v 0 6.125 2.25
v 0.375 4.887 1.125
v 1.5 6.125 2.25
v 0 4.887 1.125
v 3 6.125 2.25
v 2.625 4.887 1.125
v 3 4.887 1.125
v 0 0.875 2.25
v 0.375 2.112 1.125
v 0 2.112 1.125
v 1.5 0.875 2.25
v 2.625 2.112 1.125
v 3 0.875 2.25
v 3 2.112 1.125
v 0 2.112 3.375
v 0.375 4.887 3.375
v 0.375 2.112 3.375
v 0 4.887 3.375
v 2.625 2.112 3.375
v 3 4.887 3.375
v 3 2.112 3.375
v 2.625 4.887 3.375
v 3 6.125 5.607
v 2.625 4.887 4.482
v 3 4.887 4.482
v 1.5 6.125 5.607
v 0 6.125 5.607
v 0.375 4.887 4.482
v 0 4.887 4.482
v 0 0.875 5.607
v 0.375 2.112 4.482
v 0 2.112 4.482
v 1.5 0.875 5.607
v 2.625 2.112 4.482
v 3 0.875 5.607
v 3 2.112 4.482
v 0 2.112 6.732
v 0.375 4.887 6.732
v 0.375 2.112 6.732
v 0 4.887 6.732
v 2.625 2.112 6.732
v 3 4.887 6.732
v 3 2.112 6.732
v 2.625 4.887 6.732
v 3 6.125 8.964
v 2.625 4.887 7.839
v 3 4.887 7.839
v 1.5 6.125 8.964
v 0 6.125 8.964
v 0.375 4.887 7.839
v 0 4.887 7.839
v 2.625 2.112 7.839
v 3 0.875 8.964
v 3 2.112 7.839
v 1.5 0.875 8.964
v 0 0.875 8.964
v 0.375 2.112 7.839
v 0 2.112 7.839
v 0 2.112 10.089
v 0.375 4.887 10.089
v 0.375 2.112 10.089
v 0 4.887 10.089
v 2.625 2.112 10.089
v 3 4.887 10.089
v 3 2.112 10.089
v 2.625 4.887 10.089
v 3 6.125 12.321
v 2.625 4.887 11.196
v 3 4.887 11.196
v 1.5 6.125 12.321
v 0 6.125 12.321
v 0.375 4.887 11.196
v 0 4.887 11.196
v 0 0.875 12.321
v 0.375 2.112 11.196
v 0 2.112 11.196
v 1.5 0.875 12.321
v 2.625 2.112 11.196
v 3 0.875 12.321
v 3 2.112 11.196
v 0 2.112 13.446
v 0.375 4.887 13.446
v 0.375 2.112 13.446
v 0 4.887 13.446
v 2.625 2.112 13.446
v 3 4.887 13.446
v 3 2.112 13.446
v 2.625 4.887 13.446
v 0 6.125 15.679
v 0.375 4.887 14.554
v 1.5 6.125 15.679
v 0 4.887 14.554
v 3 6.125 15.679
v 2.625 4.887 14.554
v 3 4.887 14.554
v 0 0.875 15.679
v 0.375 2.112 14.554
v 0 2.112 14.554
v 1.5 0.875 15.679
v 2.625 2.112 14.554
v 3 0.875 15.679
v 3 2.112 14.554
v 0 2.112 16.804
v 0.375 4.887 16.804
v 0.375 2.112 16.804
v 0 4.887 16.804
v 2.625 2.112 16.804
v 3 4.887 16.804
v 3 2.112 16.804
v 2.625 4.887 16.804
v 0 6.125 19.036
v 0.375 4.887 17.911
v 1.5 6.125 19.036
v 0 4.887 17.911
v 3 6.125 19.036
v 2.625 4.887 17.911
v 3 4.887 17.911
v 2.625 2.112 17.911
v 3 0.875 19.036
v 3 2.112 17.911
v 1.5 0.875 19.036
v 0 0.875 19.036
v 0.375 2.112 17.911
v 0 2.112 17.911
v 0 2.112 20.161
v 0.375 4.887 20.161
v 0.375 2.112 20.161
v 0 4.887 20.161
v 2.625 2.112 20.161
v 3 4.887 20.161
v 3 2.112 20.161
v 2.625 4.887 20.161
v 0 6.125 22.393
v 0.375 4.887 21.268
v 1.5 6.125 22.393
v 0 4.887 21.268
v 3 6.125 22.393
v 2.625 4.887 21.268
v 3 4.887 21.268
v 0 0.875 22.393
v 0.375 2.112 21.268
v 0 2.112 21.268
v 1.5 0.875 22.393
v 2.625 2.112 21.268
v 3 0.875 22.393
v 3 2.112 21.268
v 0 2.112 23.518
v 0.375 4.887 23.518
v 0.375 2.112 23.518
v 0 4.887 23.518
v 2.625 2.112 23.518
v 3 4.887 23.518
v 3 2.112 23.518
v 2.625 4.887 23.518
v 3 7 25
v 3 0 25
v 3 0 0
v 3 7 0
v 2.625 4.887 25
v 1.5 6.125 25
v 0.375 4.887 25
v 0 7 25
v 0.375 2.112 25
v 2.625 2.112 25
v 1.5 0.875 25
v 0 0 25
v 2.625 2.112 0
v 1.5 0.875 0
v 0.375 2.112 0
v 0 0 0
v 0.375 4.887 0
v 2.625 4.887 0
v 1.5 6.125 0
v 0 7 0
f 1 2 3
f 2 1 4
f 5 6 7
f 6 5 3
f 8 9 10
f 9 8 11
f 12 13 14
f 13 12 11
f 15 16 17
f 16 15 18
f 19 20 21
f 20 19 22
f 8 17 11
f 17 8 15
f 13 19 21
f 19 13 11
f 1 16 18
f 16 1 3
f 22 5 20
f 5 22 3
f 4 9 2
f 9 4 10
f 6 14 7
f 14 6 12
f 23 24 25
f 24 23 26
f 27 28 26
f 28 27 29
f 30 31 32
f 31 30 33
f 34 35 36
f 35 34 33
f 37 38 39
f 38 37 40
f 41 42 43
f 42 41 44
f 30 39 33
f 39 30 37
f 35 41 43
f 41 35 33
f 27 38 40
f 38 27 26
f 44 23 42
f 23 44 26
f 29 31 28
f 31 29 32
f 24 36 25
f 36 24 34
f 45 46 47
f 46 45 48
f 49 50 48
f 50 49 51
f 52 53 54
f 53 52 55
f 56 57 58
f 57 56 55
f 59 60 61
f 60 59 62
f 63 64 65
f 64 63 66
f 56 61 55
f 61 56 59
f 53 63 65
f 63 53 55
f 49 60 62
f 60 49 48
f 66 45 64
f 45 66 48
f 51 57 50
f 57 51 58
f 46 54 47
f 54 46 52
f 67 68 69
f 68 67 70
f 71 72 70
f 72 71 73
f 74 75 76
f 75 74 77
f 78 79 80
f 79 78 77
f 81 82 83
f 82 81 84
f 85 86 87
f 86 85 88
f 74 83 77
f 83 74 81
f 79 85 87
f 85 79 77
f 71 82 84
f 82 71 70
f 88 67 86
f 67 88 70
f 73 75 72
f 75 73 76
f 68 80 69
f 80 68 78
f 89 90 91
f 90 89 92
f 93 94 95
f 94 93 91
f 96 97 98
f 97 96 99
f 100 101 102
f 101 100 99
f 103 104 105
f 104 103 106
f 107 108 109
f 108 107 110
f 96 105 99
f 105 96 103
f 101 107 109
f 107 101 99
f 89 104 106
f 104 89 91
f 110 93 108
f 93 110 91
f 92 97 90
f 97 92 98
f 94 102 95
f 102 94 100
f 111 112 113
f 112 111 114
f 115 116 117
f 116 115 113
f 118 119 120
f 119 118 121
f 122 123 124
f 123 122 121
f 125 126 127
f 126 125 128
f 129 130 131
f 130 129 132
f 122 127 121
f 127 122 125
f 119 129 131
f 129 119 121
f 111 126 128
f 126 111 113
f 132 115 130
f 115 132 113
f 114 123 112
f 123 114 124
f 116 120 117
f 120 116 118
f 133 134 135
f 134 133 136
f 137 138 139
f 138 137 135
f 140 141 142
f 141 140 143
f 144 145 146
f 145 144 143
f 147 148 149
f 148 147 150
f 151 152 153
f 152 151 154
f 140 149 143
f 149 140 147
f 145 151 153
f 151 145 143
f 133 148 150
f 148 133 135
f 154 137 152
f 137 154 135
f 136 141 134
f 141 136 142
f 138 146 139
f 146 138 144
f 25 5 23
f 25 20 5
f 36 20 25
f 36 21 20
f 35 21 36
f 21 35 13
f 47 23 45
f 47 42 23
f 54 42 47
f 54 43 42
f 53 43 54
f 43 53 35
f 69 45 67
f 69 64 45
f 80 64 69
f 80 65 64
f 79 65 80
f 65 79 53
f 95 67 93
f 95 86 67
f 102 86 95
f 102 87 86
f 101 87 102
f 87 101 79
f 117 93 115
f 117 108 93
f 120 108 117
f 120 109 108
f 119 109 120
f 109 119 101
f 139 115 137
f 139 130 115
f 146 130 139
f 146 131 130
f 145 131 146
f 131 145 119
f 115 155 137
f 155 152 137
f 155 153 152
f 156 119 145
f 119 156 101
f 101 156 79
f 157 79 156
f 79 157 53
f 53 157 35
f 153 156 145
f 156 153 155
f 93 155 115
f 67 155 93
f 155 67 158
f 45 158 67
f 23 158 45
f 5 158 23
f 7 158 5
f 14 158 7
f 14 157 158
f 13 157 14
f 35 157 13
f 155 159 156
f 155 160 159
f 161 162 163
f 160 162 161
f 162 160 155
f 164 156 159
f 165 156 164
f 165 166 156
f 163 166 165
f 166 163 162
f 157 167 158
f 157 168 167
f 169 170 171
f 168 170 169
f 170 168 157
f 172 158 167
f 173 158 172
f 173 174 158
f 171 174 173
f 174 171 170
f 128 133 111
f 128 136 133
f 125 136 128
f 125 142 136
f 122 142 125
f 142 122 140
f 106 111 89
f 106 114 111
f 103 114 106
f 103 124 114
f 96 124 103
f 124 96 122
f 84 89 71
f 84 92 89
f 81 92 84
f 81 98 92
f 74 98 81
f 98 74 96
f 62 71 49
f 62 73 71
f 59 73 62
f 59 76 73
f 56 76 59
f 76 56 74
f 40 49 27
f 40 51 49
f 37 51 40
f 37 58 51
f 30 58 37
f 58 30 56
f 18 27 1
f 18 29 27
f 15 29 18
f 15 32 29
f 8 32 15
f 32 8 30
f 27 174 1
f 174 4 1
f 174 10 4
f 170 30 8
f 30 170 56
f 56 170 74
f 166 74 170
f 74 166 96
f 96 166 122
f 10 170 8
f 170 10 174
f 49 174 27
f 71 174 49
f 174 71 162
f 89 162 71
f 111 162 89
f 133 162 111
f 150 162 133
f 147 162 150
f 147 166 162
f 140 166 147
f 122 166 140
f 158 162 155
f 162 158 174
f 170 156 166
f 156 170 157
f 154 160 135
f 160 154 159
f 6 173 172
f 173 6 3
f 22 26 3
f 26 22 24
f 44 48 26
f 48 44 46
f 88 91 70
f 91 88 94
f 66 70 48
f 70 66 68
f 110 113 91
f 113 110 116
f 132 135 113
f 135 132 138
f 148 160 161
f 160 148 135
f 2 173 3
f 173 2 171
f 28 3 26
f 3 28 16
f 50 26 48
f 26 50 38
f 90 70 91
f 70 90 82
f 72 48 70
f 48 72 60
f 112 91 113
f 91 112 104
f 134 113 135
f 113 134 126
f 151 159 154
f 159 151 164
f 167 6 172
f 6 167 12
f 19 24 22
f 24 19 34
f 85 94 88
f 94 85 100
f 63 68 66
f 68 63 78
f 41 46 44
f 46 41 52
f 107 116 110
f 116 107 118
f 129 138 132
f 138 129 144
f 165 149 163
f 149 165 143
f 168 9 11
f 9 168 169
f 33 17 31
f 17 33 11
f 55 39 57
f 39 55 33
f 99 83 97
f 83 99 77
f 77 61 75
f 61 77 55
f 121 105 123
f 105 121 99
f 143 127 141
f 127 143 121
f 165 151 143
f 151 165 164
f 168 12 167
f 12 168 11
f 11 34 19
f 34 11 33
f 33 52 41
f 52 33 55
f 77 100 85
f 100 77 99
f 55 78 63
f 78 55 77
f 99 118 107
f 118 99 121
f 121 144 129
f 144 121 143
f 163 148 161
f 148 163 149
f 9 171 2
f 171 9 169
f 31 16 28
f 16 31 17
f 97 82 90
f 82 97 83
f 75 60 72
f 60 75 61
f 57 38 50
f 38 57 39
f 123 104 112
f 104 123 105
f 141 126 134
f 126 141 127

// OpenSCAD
// file: ../vents.scad
module lowerVent1(w, h, extrusion)
{
    h1 = h - w * 1.2;
    h2 = h;
    rotate([90, 0, 90]) {
        linear_extrude(height=extrusion) {
            polygon([[-w/2,0], [w/2,0], [w/2,h1], [0,h2], [-w/2,h1]]);
        }
    }    
}


module vent1(w, h, n, extrusion, stop=100)
{
    angle = 360 / n;
    N = stop < n ? stop : n;

	for(r=[0:N-1]) {
		rotate([0, 0, angle*r]) {
            lowerVent1(w, h, extrusion);
        }
    }
}

module lowerVent2(w, h, extrusion)
{
    WH = w * 0.55;
    W2 = w / 2;

   rotate([90, 0, 90]) {
        linear_extrude(height=extrusion) {
            polygon([[0,0], [W2, WH], [W2, h - WH], [0, h], [-W2, h - WH], [-W2, WH]]);
        }
    }
}


module vent2(w, h, n, extrusion, stop=100)
{
    angle = 360 / n;
    N = stop < n ? stop : n;

	for(r=[0:N-1]) {
		rotate([0, 0, angle*r]) {
            lowerVent2(w, h, extrusion);
        }
    }
}

module vent3(w, h, n, extrusion)
{
    h1 = 0.6 * h;
    h2 = h;
    
	W = w / 2;
	IW = W * 0.62;
	IH = h1 * 0.38;
    
    angle = 360 / n;
	for(r=[0:n-1]) {
		rotate([0, 0, angle*r]) {

            rotate([90, 0, 90]) {
                linear_extrude(height=extrusion) {
                    difference() {
                        polygon([[-W,0], [W,0], [W,h1], [0,h2], [-W,h1]]);
                        polygon([[-IW, 0], [IW, 0], [IW, IH], [-IW, IH]]);
                    }
                }
            }
        }
	}
}

module vent4(h, r, extrusion)
{
    alpha = 16;
    w = sin(alpha) * r;

	for(i=[0:11]) {
		rotate([0, 0, 30*i]) {
			rotate([90, 0, 90]) {
				linear_extrude(height=extrusion) {
					polygon([[-w/2, 0], [w/2, 0], [0, h] ]);
				}
			}
		}
		rotate([0, 0, 30*i + 15]) {
			rotate([90, 0, 90]) {
				linear_extrude(height=extrusion) {
					polygon([[-w/2, h], [0, 0], [w/2, h] ]);
				}
			}
		}
	}
}


difference() 
{
    H = 16;
    D = D_INNER;
	tube(H, D/2 - 2, D/2);	
    
	translate([0, 0, 3]) {
        //vent1(6, H-6, 10, 40);
        //vent2(6, H-6, 8, 40);
        vent3(6, H-6, 7, 40);
		//vent4(H-6, D/2, D);
	}
}
// main file
use <../vents.scad>

EPS = 0.01;
EPS2 = EPS * 2;

module hexShape(w, h, d)
{
	// Translate to cube coordinates.
	translate([w/2, 0, 0]) rotate([-90, -90, 0]) lowerVent2(w, h, d);
}

module beam(w, h, d, lenHex=true)
{
    
    innerW = w * 0.75;
    innerH = h * 0.75;
    deltaW = w - innerW;
    deltaH = h - innerH;

    endPad = w / 4;
    nSide = floor((d - endPad*2) / w);
    space = (d - endPad*2) / nSide;

    difference() {
        cube(size=[w, h, d]);
        if (lenHex) {
        	translate([deltaW/2, deltaH/2, -EPS]) hexShape(innerW, innerH, d + EPS2);
       }
        for(i=[0:nSide-1]) 
    	{
        	//echo(i);
        	translate([w + EPS, deltaH/2, endPad + deltaW/2 + space*i]) rotate([0, -90, 0]) hexShape(innerW, innerH, w + EPS2);
        }
    }
}

beam(3, 7, 25);
